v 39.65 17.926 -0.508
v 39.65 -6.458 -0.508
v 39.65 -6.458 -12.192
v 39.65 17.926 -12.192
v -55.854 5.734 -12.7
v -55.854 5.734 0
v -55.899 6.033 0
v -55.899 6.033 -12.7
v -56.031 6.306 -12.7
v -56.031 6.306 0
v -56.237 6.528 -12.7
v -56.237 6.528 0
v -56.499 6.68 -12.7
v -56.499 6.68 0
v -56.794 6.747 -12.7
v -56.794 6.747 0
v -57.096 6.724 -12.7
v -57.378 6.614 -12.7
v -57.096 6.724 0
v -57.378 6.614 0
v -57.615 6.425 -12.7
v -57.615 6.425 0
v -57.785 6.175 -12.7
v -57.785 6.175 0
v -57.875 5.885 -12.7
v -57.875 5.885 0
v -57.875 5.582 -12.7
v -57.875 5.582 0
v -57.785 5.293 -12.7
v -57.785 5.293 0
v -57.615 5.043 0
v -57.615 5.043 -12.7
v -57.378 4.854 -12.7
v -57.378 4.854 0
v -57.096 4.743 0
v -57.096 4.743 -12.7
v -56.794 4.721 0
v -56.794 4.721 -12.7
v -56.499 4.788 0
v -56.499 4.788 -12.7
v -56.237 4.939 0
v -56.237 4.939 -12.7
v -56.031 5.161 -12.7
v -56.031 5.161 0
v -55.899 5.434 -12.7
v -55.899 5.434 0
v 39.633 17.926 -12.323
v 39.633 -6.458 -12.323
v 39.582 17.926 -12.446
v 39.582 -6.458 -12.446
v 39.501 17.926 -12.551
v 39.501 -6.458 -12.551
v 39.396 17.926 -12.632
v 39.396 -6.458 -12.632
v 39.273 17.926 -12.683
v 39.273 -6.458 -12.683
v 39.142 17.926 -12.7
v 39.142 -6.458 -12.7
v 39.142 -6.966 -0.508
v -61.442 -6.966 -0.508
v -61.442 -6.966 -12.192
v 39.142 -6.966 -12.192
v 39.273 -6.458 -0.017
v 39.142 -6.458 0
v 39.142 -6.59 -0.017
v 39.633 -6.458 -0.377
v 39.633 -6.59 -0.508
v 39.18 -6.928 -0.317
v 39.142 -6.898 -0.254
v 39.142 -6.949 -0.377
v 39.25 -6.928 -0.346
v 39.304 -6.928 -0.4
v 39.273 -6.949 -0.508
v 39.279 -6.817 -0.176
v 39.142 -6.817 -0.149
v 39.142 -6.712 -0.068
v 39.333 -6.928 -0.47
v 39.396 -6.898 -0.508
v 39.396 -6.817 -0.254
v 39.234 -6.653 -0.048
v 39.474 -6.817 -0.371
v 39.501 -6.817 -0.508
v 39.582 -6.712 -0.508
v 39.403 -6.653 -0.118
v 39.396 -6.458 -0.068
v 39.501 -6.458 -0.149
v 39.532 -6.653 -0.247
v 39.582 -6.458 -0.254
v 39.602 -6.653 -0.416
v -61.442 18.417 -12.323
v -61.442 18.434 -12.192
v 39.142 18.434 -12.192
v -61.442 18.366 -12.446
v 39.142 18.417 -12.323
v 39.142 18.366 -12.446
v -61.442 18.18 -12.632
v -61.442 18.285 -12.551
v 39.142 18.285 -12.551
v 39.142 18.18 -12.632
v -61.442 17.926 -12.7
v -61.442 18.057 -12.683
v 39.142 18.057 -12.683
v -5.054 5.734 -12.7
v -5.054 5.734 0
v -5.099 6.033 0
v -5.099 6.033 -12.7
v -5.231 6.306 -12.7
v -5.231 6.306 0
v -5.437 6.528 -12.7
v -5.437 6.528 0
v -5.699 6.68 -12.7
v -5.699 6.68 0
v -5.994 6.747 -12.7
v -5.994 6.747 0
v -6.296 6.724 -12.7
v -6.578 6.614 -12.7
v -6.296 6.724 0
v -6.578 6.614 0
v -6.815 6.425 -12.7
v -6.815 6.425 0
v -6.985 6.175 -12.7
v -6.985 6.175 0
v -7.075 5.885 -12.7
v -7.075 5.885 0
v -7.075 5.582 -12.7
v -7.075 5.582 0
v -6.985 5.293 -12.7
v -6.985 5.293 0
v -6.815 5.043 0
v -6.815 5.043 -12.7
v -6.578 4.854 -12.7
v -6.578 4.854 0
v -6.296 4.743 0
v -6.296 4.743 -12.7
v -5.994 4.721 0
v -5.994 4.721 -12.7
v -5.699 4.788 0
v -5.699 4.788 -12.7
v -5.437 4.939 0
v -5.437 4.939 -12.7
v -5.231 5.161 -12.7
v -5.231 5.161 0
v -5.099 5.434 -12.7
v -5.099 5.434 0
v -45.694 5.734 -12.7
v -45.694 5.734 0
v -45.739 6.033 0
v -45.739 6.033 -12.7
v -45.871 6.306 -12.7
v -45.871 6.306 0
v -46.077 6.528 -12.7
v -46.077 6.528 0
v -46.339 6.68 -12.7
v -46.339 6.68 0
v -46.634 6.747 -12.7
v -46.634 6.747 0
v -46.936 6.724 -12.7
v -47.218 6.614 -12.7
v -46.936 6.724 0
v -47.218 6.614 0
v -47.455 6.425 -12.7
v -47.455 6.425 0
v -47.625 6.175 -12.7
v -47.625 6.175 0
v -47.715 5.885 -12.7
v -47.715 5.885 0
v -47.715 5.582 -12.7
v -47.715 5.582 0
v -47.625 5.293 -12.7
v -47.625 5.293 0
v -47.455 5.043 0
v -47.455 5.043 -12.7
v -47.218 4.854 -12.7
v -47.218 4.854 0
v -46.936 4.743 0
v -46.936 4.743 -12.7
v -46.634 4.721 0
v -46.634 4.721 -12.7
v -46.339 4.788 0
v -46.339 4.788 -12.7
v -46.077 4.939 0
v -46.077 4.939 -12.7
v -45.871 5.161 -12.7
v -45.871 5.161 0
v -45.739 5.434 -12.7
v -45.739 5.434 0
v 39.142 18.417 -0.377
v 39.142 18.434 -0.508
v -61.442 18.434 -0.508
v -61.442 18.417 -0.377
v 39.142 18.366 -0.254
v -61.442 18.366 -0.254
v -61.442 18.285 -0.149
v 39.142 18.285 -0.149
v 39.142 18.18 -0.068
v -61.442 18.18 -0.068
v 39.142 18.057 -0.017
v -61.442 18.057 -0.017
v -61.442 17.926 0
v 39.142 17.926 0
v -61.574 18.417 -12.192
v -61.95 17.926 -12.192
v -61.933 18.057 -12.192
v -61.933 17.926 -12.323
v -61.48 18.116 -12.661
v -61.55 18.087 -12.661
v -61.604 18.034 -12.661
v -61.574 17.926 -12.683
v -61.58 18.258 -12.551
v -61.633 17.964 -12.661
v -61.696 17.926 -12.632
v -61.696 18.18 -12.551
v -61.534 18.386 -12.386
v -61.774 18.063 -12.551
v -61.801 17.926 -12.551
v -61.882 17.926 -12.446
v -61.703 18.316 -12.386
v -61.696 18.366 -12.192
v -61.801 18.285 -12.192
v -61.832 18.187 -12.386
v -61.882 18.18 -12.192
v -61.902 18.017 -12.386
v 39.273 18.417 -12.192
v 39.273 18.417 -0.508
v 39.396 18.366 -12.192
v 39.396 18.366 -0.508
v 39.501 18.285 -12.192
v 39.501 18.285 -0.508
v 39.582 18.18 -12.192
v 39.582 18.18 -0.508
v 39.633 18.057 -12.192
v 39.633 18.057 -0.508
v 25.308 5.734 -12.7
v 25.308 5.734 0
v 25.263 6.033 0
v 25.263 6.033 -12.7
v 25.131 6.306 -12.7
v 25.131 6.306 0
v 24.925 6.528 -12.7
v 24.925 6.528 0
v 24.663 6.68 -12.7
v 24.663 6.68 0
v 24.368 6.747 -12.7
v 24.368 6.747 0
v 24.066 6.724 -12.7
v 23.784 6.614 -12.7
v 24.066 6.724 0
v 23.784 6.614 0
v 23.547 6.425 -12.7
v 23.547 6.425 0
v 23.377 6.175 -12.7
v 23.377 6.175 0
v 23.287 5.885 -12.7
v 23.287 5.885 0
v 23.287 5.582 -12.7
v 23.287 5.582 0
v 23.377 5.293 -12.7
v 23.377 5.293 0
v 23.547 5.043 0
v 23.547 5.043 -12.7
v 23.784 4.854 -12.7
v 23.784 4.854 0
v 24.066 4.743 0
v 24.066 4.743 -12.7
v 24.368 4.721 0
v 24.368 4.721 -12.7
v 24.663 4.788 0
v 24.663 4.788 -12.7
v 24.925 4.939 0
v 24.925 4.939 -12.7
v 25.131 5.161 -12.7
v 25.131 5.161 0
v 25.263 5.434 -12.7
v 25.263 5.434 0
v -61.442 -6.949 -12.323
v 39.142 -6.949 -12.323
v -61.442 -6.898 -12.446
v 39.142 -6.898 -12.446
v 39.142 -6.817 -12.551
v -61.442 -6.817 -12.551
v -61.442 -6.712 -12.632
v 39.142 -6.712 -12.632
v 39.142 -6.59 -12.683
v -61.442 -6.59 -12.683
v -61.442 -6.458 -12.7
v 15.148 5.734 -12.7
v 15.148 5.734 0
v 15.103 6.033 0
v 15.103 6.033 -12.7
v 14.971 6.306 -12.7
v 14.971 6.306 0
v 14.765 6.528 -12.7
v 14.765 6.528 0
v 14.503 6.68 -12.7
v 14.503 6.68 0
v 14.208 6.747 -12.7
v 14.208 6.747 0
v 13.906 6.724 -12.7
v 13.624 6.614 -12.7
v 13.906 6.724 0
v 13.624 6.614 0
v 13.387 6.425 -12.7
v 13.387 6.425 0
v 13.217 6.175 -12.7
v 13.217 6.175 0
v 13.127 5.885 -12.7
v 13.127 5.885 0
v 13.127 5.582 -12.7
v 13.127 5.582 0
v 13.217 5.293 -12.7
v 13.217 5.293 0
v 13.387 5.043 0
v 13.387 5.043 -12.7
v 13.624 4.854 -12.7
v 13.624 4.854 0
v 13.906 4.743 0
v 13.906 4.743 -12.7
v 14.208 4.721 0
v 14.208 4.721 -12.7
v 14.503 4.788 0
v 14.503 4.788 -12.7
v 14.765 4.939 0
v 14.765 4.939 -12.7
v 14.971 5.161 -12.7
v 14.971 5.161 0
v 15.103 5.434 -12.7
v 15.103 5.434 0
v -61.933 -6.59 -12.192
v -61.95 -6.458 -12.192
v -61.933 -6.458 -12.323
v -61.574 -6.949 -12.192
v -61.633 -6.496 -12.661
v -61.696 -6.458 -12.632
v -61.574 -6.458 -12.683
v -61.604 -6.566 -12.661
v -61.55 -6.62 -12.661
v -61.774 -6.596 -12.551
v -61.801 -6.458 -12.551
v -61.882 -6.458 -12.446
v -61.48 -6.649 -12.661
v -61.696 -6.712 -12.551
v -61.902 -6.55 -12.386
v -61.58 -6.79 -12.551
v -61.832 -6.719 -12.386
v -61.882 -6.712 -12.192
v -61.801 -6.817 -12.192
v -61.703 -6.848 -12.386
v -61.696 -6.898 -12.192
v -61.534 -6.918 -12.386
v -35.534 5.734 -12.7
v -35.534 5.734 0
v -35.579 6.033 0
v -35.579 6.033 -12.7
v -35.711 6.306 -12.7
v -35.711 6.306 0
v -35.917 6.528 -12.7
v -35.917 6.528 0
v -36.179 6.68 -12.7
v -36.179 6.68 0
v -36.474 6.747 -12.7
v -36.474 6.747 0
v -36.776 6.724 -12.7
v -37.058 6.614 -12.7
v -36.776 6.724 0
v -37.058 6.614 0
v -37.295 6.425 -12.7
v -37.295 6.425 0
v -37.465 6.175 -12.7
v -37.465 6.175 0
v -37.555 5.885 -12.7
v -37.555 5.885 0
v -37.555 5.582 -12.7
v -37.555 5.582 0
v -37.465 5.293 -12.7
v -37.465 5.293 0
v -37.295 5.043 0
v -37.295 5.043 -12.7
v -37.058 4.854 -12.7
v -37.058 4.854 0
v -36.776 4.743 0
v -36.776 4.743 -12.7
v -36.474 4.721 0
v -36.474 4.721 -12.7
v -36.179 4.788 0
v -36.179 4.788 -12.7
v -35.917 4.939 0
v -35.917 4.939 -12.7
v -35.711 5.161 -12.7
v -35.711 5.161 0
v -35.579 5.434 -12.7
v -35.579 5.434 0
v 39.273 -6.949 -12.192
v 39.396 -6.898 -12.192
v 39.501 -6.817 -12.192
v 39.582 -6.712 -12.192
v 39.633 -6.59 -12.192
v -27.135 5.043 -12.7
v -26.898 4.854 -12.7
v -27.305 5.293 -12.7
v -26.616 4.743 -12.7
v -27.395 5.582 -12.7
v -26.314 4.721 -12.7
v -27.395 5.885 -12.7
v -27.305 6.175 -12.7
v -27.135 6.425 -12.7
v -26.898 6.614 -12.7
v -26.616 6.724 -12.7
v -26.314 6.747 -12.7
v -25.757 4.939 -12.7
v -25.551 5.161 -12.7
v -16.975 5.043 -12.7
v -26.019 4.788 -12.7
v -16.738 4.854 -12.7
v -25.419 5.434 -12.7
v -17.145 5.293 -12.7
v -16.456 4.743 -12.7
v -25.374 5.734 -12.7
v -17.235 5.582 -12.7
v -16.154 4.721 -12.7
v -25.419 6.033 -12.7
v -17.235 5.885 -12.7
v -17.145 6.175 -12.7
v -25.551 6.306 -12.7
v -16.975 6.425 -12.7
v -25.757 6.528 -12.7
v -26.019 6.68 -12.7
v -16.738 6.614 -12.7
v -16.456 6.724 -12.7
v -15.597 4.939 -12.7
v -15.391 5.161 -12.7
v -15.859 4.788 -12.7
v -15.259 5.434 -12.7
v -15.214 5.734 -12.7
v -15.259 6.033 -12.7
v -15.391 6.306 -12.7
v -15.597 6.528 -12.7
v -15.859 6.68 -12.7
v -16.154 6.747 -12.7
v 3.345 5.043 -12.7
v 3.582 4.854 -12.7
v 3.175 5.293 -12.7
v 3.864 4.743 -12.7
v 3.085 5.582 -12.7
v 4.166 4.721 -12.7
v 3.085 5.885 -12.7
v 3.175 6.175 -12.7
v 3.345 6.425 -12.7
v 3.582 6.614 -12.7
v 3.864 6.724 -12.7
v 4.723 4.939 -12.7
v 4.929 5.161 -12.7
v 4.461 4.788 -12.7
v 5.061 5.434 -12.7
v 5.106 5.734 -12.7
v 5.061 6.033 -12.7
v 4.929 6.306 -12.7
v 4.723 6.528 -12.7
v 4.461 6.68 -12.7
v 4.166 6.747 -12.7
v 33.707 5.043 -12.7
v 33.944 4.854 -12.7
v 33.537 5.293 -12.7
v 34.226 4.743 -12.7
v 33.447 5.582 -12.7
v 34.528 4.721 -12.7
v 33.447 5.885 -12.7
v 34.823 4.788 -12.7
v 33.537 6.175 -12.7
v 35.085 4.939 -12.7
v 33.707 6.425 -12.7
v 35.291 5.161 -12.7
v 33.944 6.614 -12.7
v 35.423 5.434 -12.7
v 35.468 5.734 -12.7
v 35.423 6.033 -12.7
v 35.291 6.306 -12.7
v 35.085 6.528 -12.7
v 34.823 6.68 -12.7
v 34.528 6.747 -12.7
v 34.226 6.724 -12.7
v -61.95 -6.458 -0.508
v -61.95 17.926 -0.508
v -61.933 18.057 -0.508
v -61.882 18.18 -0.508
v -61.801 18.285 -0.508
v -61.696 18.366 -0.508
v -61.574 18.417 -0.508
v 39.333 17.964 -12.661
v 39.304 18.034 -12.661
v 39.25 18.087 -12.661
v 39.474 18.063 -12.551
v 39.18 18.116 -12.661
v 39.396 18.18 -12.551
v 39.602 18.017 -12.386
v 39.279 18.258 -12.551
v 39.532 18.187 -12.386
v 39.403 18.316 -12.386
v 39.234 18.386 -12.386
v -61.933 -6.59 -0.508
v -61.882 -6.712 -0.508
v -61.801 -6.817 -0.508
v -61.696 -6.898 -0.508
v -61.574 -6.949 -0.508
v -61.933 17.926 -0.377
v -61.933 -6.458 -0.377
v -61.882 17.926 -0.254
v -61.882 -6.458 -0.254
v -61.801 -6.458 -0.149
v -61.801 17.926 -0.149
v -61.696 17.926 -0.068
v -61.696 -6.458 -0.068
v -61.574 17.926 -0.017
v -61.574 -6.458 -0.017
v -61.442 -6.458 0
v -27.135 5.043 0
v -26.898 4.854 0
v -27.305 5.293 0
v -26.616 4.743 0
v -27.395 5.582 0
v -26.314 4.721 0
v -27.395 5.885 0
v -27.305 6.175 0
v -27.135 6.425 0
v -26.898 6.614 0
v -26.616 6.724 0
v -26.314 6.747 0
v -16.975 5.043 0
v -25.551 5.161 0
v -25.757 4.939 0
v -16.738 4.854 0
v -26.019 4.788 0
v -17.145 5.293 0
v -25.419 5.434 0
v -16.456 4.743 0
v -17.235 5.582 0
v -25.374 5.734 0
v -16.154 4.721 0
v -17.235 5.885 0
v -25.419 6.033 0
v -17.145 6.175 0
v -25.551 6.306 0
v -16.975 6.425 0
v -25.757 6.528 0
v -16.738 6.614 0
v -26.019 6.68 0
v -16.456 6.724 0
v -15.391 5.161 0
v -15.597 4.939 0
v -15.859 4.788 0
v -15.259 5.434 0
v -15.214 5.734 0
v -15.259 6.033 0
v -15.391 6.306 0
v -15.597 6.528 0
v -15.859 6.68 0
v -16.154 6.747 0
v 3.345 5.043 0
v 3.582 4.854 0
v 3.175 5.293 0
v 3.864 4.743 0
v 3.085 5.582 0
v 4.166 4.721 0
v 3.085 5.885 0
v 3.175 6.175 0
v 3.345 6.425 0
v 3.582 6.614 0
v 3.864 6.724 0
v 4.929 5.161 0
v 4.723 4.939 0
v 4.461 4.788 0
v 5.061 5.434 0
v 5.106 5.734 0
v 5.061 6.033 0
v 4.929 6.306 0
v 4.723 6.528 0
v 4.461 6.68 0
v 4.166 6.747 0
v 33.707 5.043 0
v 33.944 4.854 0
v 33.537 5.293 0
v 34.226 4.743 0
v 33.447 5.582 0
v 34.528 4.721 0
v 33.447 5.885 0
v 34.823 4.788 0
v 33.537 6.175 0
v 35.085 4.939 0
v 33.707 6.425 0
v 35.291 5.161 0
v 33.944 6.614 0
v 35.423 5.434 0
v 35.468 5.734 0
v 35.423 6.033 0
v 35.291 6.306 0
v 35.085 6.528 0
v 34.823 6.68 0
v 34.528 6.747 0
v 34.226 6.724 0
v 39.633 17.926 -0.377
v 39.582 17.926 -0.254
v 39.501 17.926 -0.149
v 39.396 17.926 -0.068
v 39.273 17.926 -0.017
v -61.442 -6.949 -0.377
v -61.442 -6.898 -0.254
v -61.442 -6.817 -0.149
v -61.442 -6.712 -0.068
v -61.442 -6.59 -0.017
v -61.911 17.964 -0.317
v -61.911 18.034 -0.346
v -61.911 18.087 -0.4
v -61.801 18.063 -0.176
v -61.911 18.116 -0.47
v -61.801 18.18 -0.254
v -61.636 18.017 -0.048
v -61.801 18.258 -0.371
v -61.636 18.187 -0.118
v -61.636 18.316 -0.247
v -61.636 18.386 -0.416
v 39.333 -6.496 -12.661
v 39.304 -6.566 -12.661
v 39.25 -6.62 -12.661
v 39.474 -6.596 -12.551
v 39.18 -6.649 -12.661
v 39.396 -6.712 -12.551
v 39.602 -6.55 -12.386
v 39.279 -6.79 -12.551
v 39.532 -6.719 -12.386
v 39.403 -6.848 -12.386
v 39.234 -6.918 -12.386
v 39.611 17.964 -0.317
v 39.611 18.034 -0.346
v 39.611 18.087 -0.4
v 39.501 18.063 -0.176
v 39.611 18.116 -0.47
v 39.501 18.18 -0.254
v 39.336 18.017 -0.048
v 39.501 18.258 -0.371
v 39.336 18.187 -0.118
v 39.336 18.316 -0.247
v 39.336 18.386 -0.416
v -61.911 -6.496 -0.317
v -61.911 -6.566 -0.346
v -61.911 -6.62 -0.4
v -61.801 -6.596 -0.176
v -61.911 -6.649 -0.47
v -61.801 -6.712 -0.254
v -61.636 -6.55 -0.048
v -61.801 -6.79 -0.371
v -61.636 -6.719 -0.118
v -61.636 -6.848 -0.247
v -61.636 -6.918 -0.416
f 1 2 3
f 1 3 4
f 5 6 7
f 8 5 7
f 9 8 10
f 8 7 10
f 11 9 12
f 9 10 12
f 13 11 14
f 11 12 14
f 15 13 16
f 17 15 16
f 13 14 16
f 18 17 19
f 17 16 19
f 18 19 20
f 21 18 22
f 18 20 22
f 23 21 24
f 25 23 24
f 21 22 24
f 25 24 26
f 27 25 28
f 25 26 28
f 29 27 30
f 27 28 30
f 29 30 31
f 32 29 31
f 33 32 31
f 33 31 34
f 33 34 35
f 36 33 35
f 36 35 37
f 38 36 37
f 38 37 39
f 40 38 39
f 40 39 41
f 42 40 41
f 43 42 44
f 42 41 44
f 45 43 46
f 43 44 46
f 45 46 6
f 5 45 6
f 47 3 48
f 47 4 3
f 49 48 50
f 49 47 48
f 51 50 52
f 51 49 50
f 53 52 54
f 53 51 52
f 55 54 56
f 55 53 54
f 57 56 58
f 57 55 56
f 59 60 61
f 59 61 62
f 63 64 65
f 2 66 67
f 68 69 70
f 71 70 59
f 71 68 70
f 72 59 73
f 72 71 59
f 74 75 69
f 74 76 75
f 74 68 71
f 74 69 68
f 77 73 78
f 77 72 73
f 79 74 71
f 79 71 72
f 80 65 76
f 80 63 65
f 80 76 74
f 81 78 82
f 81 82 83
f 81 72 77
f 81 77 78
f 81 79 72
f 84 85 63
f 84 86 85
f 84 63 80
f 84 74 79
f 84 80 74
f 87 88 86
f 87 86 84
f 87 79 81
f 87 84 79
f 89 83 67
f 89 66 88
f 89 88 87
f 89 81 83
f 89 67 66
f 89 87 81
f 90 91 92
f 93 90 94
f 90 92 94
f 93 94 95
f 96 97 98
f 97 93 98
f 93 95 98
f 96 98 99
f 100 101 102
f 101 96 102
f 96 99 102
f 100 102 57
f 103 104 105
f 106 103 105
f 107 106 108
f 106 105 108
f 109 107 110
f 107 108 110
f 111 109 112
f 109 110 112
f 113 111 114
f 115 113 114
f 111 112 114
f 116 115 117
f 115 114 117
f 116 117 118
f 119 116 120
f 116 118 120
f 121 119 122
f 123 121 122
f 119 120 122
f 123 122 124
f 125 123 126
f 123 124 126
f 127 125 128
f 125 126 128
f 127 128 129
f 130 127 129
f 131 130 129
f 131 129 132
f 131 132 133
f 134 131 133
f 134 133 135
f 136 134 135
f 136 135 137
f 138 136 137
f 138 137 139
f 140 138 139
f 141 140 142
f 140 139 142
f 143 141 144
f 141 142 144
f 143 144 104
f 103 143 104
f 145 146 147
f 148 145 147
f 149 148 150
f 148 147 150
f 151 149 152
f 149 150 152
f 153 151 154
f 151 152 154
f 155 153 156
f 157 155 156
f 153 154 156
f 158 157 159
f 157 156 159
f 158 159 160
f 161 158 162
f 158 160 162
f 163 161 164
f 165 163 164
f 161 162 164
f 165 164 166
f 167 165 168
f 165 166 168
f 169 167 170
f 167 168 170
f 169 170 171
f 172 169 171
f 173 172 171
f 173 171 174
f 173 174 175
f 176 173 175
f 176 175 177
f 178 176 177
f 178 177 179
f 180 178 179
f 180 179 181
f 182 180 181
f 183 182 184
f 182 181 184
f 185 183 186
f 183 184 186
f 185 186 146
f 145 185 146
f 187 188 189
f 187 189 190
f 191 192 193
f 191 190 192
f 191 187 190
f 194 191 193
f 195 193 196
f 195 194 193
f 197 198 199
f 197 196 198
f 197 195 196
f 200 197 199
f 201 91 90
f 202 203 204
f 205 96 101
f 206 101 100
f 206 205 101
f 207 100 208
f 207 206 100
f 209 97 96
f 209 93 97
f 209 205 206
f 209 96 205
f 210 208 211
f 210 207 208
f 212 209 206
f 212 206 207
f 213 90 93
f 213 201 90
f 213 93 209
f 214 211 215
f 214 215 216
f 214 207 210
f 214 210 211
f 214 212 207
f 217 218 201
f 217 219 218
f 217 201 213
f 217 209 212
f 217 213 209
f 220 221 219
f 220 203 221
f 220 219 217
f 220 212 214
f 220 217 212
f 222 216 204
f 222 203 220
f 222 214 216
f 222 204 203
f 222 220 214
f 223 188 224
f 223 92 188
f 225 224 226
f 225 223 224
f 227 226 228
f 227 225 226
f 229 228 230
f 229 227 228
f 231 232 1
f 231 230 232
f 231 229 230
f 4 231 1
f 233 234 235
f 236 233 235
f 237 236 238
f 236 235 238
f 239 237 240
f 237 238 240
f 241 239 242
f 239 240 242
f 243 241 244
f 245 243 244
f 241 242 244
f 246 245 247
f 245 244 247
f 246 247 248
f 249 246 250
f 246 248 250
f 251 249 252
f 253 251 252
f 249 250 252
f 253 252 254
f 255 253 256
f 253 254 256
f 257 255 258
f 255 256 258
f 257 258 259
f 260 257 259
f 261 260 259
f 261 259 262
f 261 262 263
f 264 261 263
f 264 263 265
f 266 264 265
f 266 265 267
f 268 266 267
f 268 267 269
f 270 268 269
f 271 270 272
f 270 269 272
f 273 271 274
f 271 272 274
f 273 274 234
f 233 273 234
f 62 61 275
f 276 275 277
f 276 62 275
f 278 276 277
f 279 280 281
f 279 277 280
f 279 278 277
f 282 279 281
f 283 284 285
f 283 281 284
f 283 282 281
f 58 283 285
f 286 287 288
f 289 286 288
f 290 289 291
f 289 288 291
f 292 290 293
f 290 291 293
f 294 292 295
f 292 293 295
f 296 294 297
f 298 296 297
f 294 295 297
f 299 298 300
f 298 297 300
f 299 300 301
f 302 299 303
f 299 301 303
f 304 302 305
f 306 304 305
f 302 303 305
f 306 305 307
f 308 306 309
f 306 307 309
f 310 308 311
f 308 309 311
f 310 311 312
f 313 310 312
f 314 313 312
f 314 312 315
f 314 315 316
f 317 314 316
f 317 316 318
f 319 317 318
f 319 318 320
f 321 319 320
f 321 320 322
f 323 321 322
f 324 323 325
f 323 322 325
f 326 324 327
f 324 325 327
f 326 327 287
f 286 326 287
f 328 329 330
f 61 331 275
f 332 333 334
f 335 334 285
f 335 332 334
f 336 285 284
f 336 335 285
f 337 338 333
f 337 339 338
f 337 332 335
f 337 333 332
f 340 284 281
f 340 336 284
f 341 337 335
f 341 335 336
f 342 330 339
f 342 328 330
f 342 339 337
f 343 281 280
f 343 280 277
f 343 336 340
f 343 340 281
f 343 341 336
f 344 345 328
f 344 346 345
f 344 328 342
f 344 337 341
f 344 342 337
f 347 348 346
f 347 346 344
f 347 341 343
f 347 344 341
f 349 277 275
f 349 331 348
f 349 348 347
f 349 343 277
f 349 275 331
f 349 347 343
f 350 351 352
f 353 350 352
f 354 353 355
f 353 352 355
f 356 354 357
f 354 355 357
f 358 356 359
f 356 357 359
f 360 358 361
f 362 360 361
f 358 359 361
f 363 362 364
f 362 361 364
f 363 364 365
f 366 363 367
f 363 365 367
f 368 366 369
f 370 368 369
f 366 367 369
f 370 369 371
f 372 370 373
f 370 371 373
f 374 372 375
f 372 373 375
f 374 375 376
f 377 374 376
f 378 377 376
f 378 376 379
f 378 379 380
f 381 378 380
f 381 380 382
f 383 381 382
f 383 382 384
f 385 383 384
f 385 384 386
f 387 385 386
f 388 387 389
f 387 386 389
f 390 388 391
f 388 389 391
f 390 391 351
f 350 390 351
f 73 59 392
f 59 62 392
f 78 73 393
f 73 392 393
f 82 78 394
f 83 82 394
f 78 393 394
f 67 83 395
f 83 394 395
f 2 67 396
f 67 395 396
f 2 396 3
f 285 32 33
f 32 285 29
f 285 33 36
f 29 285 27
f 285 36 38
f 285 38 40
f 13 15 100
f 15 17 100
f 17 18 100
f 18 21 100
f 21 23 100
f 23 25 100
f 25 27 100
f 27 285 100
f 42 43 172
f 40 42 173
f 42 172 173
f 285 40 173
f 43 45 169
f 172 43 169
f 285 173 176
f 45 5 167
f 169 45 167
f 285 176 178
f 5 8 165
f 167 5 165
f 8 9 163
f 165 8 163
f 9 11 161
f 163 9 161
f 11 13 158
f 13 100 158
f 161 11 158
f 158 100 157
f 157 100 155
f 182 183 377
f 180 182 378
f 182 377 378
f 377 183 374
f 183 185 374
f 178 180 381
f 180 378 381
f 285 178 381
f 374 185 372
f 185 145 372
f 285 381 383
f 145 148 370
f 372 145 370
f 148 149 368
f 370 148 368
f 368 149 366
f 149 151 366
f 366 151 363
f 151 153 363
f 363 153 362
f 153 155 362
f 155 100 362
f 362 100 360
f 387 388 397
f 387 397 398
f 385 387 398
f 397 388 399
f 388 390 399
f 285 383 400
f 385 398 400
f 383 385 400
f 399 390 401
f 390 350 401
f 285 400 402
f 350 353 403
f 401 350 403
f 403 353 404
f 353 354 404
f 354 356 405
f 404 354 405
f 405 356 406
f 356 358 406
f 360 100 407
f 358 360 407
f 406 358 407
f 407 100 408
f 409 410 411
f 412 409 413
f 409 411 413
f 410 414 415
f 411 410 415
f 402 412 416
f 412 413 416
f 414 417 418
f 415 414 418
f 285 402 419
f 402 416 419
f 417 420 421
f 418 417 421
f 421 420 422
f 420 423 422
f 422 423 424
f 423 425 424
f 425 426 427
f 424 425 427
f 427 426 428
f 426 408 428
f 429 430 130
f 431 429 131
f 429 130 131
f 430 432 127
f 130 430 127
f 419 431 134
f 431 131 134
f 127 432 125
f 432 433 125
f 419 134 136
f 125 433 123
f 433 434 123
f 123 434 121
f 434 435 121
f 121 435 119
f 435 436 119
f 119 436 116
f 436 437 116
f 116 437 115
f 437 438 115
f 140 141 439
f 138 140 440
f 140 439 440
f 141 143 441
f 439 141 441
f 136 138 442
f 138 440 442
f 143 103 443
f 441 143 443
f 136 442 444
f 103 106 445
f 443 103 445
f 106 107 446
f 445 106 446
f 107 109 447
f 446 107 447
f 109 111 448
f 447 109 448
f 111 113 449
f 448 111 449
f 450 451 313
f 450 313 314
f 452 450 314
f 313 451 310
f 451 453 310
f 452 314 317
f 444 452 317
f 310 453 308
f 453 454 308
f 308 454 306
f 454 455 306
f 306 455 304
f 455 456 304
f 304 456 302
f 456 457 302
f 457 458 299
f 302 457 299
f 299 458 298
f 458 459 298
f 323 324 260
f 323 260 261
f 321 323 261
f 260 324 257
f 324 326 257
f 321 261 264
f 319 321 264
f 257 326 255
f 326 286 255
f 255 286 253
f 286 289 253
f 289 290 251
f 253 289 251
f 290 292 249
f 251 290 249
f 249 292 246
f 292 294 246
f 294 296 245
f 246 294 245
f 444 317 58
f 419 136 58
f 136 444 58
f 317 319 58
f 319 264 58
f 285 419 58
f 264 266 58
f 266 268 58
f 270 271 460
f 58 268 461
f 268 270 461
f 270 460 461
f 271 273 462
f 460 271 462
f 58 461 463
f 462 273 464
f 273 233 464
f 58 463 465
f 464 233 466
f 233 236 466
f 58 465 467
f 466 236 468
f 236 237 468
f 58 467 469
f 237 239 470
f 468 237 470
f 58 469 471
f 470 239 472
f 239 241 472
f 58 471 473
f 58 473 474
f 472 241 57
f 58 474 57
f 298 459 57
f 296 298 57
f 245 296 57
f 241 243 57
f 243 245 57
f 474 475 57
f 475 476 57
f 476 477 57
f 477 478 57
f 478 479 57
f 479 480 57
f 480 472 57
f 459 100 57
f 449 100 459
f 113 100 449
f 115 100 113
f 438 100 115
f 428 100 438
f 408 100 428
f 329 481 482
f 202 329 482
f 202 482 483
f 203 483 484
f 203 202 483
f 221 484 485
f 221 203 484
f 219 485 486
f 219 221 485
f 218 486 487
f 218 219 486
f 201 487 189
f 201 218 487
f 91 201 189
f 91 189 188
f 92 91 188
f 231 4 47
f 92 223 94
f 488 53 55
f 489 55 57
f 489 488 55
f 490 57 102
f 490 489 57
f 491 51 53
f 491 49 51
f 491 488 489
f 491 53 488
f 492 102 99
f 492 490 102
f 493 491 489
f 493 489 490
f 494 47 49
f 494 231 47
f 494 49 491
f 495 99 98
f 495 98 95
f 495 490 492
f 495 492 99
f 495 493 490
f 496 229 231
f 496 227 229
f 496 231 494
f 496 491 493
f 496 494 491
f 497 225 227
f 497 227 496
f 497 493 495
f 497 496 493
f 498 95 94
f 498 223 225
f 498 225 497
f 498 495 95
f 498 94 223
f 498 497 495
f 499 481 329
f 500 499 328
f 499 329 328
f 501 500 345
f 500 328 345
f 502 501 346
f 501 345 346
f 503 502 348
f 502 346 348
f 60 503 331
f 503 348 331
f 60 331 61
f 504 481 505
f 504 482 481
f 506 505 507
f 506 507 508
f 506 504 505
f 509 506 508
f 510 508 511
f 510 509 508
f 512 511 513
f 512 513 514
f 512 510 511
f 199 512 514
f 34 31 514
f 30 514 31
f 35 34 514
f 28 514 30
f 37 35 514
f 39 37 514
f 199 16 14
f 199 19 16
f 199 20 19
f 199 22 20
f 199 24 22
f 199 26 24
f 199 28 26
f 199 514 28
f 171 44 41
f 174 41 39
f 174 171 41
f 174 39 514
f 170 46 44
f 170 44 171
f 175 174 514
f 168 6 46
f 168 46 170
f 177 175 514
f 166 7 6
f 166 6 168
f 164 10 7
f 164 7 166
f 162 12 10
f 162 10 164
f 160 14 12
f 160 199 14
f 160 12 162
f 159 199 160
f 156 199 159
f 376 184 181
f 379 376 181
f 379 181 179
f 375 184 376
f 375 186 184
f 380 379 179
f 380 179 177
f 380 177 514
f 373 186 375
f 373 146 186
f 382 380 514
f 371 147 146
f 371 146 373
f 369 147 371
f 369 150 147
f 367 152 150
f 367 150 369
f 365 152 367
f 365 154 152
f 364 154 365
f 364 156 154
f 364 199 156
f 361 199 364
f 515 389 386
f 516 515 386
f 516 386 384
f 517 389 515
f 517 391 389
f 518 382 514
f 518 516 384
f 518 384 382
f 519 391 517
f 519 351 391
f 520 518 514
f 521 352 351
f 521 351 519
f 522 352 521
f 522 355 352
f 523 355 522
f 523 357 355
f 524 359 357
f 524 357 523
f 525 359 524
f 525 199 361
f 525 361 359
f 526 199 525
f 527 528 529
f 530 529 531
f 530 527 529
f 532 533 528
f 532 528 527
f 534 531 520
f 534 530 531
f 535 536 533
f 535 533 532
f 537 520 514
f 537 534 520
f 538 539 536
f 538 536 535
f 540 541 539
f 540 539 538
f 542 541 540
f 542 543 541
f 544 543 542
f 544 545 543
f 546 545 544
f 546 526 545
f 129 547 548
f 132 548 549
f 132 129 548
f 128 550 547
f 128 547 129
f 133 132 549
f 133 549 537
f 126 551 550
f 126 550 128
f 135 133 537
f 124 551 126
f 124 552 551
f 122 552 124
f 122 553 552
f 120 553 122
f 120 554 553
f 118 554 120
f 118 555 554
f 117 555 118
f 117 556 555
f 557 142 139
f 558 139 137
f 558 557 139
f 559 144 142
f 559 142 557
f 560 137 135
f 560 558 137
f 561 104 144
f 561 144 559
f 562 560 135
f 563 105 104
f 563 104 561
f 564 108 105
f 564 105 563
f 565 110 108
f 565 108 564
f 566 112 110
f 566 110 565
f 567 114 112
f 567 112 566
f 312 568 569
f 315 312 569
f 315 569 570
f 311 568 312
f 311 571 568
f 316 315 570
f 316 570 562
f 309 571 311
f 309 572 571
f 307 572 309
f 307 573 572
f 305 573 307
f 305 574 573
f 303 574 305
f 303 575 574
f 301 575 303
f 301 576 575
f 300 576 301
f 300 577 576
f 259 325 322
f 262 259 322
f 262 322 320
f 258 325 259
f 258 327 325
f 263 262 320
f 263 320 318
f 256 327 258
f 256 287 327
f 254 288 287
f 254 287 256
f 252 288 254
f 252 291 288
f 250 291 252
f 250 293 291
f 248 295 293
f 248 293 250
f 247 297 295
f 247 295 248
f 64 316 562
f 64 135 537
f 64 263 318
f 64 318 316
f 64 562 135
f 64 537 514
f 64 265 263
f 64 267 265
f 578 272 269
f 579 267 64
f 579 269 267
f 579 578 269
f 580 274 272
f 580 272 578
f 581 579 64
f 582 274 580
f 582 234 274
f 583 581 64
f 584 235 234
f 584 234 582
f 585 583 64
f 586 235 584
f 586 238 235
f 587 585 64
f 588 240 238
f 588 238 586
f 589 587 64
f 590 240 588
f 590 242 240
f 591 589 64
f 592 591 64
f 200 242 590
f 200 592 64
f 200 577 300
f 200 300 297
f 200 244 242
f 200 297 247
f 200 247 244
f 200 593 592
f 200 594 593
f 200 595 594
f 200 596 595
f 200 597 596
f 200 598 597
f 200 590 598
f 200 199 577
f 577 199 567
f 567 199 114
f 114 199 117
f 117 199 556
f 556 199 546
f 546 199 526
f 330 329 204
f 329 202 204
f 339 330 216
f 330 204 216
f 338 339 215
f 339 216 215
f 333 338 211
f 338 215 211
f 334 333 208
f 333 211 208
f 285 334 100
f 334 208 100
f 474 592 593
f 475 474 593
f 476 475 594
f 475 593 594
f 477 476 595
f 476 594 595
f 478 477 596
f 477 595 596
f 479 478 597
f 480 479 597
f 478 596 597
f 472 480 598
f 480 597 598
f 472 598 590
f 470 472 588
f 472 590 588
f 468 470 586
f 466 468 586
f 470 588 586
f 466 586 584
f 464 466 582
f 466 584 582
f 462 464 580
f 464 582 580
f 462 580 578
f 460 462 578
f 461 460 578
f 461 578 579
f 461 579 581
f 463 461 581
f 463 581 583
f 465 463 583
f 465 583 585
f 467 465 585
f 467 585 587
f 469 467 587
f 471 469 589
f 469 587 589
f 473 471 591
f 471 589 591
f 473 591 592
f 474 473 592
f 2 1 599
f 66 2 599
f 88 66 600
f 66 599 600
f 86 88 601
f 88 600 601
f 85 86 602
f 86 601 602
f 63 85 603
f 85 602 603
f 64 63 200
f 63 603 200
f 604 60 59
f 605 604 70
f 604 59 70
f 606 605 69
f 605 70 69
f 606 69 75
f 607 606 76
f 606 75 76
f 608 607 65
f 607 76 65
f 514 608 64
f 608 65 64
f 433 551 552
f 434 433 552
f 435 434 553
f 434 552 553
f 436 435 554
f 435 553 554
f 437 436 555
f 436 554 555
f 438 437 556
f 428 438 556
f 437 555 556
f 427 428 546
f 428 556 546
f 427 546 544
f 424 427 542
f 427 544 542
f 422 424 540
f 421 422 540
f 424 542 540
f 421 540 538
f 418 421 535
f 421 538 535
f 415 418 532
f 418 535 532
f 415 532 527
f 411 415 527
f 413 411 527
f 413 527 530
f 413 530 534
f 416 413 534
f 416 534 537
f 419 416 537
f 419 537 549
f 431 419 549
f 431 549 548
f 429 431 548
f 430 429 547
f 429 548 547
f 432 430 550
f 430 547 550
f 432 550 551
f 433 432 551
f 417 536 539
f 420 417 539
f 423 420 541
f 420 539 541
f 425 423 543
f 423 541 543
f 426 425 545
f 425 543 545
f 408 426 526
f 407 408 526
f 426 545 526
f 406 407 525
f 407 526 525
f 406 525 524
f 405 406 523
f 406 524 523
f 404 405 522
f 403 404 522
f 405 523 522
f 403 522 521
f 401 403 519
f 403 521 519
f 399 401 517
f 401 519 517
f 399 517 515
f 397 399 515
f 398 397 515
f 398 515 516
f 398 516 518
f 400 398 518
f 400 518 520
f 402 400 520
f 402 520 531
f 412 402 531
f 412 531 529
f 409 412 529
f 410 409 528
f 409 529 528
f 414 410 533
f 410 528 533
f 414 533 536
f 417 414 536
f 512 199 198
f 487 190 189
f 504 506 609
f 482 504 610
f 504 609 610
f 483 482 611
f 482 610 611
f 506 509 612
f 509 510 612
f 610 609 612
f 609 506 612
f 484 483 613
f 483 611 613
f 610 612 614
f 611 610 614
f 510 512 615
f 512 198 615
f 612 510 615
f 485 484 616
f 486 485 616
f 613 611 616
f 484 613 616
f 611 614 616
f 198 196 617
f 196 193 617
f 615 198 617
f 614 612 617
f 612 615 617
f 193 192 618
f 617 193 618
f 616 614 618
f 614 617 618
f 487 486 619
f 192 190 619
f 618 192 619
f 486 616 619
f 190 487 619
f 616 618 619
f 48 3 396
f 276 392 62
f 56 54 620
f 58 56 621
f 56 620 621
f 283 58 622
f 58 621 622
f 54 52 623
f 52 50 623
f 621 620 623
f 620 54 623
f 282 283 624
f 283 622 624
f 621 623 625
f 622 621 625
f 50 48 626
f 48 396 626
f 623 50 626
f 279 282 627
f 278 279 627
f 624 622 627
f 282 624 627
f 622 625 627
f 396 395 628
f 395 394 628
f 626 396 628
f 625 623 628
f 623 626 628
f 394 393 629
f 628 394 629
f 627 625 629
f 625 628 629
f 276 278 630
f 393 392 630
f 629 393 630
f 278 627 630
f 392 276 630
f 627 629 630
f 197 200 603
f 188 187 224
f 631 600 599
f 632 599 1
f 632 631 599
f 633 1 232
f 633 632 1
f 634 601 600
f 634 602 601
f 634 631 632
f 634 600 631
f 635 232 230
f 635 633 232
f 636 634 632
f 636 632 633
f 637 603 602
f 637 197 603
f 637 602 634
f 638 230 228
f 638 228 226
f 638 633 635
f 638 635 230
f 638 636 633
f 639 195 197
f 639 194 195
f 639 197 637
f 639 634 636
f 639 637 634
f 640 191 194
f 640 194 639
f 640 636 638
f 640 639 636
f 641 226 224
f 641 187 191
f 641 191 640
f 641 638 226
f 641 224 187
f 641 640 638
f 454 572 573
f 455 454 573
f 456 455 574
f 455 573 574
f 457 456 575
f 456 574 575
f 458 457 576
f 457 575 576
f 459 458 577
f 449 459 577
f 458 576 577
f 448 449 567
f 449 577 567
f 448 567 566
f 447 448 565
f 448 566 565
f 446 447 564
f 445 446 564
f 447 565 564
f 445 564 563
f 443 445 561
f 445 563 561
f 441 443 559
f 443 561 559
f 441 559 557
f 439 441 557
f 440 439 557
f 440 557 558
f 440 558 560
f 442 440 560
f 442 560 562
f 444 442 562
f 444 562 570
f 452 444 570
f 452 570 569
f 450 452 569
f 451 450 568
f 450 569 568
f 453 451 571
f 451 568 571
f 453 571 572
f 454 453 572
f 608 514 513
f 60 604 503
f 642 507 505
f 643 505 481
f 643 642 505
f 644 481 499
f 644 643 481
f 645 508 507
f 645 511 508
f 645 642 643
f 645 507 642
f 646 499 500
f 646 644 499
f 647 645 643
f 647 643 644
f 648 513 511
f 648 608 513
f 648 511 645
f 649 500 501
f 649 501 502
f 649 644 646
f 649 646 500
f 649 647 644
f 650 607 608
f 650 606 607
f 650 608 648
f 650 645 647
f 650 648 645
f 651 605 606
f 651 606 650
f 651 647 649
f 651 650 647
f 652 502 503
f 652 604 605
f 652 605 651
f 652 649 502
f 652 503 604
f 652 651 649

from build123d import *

# Parameters (mm, degrees)
F0_W     = 101.6
F0_H     = 25.4
F0_R     = 1.016
F1_DEPTH = 12.7
F2_R     = 0.508


with BuildPart() as f1:
    # F0 (on Top) → F1 (new body)
    with BuildSketch(Plane.XY):
        with Locations((-11.150051, 5.733814)):
            Rectangle(F0_W, F0_H)
        with Locations((-56.870051, 5.733814)):
            Circle(F0_R, mode=Mode.SUBTRACT)
        with Locations((-46.710051, 5.733814)):
            Circle(F0_R, mode=Mode.SUBTRACT)
        with Locations((-36.550051, 5.733814)):
            Circle(F0_R, mode=Mode.SUBTRACT)
        with Locations((-26.390051, 5.733814)):
            Circle(F0_R, mode=Mode.SUBTRACT)
        with Locations((-16.230051, 5.733814)):
            Circle(F0_R, mode=Mode.SUBTRACT)
        with Locations((-6.070051, 5.733814)):
            Circle(F0_R, mode=Mode.SUBTRACT)
        with Locations((4.089949, 5.733814)):
            Circle(F0_R, mode=Mode.SUBTRACT)
        with Locations((14.131892, 5.733814)):
            Circle(F0_R, mode=Mode.SUBTRACT)
        with Locations((24.291892, 5.733814)):
            Circle(F0_R, mode=Mode.SUBTRACT)
        with Locations((34.451892, 5.733814)):
            Circle(F0_R, mode=Mode.SUBTRACT)
    extrude(amount=-F1_DEPTH)

    # F2
    f2_edges = [f1.edges().sort_by_distance(p)[0] for p in [
        (-11.150051, 18.433814, 0),
        (39.649949, 5.733814, 0),
        (-11.150051, -6.966186, 0),
        (-61.950051, 5.733814, 0),
        (-61.950051, -6.966186, -6.35),
        (39.649949, -6.966186, -6.35),
        (39.649949, 18.433814, -6.35),
        (-61.950051, 18.433814, -6.35),
        (39.649949, 5.733814, -12.7),
        (-11.150051, 18.433814, -12.7),
        (-61.950051, 5.733814, -12.7),
        (-11.150051, -6.966186, -12.7),
    ]]
    fillet(f2_edges, radius=F2_R)


solid = f1.part
